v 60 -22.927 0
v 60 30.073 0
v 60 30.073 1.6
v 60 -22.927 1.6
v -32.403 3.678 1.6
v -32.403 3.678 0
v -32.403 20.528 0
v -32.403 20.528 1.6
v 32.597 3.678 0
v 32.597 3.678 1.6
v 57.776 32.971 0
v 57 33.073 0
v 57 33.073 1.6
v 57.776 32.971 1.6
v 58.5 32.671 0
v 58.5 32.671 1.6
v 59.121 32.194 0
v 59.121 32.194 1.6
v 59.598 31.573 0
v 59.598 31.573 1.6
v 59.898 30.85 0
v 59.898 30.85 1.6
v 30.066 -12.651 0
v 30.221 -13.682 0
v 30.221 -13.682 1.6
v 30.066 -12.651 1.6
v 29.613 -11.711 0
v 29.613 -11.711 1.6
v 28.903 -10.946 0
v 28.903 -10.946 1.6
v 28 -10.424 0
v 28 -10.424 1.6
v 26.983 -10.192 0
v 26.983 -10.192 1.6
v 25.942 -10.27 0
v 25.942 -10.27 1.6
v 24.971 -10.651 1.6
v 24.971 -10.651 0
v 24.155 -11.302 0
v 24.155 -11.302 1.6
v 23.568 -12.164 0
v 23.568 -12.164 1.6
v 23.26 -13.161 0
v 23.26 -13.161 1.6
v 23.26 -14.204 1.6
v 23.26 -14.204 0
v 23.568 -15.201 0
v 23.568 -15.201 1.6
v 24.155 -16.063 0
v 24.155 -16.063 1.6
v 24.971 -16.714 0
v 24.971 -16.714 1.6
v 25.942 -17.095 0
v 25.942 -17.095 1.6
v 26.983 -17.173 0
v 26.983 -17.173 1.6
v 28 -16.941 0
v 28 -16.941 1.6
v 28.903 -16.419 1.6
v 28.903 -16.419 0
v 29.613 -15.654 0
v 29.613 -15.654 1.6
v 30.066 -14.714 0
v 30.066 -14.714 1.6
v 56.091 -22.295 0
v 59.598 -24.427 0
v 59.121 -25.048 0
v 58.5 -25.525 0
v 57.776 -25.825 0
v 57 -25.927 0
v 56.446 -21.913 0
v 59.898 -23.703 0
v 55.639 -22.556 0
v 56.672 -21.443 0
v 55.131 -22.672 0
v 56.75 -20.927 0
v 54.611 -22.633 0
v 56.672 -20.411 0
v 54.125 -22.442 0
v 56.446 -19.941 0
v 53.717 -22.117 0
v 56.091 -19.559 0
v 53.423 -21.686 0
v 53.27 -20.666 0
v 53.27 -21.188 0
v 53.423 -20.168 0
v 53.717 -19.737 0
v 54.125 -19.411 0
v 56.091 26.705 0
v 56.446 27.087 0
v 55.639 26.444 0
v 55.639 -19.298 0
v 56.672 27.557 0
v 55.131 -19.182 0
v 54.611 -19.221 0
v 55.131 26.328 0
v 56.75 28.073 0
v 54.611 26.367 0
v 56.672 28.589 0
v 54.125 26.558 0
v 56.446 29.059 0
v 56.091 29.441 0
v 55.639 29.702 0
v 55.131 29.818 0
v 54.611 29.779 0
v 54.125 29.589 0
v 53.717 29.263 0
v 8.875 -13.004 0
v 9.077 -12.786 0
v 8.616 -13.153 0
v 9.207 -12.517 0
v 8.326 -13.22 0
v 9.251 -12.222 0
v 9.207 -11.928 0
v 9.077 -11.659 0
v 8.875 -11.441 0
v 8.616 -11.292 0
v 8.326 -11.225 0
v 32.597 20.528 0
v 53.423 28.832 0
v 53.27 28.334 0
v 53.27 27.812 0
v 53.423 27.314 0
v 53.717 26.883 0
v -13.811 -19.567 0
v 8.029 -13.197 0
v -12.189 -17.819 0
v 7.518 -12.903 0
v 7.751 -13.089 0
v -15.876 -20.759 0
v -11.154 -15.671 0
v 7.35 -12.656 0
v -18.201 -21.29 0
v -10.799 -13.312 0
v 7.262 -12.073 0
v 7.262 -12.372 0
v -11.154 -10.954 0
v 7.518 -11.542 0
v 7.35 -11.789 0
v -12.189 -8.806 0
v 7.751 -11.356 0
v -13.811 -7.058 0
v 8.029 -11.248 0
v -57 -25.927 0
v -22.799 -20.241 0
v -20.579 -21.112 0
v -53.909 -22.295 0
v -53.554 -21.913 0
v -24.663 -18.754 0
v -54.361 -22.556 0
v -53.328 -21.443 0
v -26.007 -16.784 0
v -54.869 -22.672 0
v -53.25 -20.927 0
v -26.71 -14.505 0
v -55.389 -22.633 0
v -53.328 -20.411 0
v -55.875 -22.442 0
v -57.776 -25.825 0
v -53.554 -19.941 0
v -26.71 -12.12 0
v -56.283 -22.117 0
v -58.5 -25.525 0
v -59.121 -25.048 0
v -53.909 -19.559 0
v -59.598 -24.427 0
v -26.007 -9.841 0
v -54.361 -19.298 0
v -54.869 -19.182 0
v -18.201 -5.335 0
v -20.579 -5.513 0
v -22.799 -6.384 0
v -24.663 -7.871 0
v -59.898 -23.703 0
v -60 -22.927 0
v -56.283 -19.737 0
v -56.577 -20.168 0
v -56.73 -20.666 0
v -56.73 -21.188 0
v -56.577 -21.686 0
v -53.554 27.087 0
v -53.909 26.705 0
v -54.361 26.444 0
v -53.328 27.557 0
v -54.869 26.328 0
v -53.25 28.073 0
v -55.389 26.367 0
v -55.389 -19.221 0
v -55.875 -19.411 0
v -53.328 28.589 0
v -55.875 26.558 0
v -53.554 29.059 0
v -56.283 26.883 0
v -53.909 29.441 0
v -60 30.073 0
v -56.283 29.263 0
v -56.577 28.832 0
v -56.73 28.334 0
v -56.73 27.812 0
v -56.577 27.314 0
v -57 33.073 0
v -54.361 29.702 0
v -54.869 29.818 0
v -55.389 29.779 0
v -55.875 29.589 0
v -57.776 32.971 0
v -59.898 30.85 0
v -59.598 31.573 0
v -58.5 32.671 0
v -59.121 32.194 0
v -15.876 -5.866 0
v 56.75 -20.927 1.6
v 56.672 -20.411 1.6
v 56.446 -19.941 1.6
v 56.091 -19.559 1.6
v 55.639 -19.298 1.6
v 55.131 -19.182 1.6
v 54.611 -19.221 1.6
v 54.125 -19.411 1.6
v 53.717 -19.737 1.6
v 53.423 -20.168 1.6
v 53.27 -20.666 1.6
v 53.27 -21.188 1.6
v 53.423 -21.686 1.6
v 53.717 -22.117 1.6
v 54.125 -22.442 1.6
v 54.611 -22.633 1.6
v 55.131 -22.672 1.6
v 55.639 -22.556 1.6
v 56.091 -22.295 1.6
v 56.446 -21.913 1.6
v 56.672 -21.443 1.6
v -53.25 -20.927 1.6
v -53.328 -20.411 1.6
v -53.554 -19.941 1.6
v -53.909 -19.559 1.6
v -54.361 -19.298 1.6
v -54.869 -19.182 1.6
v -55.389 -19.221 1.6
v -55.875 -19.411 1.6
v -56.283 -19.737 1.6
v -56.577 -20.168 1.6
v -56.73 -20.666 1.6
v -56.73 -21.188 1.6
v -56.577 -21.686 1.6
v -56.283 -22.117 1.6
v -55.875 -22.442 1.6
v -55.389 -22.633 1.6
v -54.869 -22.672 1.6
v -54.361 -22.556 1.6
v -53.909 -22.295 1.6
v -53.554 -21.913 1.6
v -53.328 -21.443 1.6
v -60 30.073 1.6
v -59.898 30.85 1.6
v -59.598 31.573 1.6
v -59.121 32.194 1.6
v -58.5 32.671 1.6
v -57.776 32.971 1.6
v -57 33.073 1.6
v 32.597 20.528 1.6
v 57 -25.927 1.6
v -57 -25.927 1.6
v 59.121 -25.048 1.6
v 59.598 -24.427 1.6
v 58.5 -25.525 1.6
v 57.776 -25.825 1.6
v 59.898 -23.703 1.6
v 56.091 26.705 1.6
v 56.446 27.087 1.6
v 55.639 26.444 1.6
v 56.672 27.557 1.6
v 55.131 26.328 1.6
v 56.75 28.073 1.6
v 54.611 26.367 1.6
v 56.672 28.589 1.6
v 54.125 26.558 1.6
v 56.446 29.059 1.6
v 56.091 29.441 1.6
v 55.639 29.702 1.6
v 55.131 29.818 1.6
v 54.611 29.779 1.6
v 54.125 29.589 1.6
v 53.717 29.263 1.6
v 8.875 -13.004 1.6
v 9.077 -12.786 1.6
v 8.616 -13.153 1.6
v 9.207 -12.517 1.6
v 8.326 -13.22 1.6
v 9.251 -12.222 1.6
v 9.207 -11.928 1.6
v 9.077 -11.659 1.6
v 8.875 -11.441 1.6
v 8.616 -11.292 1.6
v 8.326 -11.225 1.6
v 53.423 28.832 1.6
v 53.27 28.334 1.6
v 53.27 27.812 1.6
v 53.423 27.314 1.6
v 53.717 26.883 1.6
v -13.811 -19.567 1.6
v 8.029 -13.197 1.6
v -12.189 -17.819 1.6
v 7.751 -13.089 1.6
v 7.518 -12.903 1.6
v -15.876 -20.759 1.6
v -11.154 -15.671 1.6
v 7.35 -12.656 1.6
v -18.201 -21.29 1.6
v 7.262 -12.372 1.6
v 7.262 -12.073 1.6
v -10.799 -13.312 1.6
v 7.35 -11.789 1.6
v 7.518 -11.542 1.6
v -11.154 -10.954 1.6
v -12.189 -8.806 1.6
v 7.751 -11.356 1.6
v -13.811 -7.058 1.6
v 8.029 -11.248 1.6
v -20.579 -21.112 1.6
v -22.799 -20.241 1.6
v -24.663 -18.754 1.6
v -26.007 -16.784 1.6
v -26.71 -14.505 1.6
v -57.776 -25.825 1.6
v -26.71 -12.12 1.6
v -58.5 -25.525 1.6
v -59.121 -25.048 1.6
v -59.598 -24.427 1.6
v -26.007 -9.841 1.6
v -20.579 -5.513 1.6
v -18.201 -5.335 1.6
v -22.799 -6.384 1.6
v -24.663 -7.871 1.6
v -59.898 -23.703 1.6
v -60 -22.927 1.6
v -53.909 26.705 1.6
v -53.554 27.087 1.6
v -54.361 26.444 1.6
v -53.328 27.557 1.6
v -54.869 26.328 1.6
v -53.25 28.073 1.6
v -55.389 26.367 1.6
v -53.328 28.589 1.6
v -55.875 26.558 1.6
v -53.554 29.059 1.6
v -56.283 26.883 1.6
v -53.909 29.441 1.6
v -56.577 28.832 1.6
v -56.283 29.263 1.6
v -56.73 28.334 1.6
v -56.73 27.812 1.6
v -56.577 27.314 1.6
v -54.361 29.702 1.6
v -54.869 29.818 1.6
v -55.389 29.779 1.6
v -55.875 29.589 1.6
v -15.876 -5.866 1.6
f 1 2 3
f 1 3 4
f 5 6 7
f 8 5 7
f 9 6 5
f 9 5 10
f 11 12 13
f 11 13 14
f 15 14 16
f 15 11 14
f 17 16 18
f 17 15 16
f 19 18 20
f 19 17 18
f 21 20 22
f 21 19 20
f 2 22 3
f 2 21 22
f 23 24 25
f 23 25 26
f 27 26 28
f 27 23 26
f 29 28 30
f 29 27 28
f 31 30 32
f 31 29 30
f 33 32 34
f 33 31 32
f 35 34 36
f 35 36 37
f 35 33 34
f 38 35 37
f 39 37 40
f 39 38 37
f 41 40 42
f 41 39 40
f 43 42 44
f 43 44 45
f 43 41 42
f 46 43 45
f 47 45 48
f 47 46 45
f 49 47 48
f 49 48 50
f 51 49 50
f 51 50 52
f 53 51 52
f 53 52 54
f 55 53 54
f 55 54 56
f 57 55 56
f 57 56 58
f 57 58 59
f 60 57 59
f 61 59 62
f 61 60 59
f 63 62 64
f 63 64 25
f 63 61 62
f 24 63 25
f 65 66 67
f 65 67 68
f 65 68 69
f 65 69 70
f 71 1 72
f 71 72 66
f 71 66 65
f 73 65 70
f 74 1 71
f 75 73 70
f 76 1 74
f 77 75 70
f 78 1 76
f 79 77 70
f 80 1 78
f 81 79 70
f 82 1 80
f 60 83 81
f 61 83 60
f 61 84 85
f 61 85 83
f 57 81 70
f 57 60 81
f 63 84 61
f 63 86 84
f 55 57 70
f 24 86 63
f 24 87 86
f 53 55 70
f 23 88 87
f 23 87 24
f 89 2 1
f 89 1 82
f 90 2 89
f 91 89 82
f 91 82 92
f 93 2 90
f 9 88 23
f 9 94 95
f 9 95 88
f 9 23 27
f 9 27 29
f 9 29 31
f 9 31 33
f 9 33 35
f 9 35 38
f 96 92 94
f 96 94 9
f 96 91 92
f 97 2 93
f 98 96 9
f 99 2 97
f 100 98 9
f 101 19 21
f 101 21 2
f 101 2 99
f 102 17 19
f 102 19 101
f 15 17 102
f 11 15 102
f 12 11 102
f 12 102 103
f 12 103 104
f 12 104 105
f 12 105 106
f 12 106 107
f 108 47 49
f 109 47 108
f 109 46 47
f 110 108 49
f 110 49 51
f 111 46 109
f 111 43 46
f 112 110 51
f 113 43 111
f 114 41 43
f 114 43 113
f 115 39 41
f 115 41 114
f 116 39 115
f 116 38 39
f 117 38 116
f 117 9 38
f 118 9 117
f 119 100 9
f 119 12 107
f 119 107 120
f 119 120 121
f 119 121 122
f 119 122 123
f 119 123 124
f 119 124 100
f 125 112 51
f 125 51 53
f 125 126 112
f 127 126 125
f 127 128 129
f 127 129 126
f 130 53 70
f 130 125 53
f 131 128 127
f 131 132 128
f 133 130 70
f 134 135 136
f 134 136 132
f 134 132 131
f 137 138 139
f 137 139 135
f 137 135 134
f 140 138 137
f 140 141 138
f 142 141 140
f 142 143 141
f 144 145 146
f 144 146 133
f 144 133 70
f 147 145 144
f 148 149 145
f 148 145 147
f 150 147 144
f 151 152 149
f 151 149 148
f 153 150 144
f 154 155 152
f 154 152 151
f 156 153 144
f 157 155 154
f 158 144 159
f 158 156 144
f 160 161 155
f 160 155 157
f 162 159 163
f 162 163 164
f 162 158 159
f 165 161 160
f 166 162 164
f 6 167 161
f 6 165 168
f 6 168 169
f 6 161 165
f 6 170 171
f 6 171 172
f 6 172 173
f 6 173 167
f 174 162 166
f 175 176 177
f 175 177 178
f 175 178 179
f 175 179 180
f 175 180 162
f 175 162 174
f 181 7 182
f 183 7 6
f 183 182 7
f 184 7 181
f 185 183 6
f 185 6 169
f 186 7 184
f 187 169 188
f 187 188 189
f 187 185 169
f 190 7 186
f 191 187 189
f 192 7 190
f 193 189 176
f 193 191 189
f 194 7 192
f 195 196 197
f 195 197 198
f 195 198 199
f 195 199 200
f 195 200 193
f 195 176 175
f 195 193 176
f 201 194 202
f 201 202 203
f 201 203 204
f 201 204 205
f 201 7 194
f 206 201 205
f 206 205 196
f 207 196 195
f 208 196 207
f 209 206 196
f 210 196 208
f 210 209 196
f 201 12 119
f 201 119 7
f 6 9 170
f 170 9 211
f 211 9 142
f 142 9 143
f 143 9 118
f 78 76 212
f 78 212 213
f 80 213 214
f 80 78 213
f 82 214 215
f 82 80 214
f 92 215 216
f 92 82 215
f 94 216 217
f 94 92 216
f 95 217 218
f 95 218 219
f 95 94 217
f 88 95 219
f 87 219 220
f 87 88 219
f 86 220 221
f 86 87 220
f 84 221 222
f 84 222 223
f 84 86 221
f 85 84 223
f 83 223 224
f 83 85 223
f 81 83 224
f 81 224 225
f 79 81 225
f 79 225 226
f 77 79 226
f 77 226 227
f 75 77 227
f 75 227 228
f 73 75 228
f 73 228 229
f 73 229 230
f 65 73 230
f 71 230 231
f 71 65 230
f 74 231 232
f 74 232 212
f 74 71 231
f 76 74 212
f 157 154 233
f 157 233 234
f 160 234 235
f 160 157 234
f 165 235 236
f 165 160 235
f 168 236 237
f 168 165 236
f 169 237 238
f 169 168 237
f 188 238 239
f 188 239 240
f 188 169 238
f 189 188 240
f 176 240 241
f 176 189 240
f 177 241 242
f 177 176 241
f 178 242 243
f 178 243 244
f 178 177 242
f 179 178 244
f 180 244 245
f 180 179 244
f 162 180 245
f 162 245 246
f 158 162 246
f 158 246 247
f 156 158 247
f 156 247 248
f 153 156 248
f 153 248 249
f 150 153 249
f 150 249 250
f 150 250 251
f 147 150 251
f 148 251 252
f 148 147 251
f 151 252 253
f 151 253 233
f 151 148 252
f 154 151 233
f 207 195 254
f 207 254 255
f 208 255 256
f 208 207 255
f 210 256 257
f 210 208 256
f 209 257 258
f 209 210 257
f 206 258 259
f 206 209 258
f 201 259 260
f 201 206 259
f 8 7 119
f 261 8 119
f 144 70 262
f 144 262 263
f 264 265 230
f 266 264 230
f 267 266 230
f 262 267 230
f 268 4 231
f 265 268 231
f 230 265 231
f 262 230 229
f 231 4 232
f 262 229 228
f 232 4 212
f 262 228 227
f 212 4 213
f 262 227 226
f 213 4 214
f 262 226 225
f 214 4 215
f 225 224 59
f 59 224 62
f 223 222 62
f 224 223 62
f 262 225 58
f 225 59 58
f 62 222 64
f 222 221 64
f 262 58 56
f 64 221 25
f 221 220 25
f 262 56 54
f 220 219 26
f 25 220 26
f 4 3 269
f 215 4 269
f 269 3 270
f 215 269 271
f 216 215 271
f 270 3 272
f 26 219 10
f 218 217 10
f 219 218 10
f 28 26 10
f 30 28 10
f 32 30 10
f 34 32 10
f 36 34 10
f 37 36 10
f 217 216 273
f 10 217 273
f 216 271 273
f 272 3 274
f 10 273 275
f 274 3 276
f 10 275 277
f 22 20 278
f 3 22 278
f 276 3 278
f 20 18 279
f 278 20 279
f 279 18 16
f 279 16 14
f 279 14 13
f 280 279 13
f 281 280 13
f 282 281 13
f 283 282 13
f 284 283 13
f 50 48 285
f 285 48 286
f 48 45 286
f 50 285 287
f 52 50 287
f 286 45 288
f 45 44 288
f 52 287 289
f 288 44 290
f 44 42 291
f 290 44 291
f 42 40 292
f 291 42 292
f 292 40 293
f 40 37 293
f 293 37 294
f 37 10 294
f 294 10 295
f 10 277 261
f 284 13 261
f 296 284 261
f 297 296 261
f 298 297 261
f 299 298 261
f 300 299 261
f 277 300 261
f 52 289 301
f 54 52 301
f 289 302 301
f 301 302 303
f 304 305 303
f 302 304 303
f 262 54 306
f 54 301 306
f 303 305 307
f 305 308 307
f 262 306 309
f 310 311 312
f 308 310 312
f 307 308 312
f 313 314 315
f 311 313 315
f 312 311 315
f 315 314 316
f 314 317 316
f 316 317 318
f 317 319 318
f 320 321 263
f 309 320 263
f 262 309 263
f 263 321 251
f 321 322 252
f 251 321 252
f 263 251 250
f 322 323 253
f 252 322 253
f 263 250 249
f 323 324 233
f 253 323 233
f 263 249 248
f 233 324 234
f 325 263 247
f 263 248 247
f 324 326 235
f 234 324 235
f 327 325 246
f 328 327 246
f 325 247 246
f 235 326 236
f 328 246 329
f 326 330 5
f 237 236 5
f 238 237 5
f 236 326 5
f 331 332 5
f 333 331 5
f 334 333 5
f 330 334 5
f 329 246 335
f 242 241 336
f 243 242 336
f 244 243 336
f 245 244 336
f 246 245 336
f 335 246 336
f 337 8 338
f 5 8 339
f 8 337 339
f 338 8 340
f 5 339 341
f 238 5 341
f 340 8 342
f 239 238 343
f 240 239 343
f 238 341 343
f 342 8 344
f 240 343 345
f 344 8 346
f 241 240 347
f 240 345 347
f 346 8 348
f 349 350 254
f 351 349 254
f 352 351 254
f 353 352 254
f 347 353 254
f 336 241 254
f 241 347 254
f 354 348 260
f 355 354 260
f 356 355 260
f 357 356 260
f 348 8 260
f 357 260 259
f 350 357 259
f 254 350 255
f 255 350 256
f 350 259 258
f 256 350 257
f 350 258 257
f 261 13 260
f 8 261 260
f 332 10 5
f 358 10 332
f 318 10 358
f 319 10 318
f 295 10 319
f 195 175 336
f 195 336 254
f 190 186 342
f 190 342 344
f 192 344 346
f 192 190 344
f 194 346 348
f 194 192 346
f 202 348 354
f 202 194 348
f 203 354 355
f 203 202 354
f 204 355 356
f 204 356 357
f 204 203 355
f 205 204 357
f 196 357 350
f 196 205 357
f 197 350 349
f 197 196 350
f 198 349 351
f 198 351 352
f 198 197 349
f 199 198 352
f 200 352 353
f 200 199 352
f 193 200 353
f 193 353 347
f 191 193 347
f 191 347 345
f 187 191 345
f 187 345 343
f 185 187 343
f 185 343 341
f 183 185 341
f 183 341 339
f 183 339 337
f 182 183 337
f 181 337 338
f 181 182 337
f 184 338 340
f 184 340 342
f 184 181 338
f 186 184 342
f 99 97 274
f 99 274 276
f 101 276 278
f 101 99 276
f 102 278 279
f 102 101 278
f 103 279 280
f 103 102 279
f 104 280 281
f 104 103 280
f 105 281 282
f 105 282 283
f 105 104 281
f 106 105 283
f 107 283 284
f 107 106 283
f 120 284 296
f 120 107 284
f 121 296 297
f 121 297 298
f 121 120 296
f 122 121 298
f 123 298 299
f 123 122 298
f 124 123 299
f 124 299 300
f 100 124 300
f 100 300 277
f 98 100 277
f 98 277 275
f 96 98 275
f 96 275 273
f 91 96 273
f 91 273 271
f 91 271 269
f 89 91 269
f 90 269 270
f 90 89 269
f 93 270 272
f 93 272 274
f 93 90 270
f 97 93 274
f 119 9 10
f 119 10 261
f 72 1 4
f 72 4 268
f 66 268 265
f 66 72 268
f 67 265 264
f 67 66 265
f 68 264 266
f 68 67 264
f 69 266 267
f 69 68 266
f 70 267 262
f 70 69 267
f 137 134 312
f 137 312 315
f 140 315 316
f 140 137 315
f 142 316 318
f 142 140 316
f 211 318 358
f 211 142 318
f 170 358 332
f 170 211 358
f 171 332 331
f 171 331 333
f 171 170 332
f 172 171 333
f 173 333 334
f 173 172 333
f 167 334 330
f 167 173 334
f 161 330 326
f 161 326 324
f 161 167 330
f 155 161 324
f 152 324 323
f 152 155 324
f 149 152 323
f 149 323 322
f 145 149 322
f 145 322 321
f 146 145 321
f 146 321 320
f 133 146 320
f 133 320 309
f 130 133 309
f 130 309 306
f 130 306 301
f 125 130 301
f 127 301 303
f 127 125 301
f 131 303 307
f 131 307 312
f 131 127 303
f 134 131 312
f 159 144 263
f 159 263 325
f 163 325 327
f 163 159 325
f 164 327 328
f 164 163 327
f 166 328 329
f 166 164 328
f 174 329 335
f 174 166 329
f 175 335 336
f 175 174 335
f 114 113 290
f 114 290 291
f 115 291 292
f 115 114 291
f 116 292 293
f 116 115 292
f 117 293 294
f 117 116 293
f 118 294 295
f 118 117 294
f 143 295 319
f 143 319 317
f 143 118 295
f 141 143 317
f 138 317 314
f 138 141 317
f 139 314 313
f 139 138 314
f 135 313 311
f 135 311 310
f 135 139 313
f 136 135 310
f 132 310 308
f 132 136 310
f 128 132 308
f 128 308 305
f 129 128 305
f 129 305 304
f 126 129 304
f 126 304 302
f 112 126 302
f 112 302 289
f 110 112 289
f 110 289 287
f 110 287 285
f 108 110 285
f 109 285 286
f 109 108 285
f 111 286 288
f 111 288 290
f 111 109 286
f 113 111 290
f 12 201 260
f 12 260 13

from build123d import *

# Parameters (mm, degrees)
SKETCH_1_R      = 1.75
SKETCH_1_R_2    = 3.5
SKETCH_1_R_3    = 8
SKETCH_1_R_4    = 1
SKETCH_1_W      = 65
SKETCH_1_H      = 16.85
EXTRUDE_1_DEPTH = 1.6


with BuildPart() as part:
    # 草图1 → 凸台-拉伸1 (new body)
    with BuildSketch(Plane.XY):
        with BuildLine():
            Line((-57, 33.073154828), (57, 33.073154828))
            ThreePointArc((57, 33.073154828), (59.121320344, 32.194475172), (60, 30.073154828))
            Line((60, 30.073154828), (60, -22.926845172))
            ThreePointArc((60, -22.926845172), (59.121320344, -25.048165515), (57, -25.926845172))
            Line((57, -25.926845172), (-57, -25.926845172))
            ThreePointArc((-57, -25.926845172), (-59.121320344, -25.048165515), (-60, -22.926845172))
            Line((-60, -22.926845172), (-60, 30.073154828))
            ThreePointArc((-60, 30.073154828), (-59.121320344, 32.194475172), (-57, 33.073154828))
        make_face()
        with Locations((-55, -20.926845172)):
            Circle(SKETCH_1_R, mode=Mode.SUBTRACT)
        with Locations((55, -20.926845172)):
            Circle(SKETCH_1_R, mode=Mode.SUBTRACT)
        with Locations((55, 28.073154828)):
            Circle(SKETCH_1_R, mode=Mode.SUBTRACT)
        with Locations((-55, 28.073154828)):
            Circle(SKETCH_1_R, mode=Mode.SUBTRACT)
        with Locations((26.721118862, -13.682497654)):
            Circle(SKETCH_1_R_2, mode=Mode.SUBTRACT)
        with Locations((-18.798880758, -13.312497654)):
            Circle(SKETCH_1_R_3, mode=Mode.SUBTRACT)
        with Locations((8.251119242, -12.222497654)):
            Circle(SKETCH_1_R_4, mode=Mode.SUBTRACT)
        with Locations((0.097411242, 12.102502346)):
            Rectangle(SKETCH_1_W, SKETCH_1_H, mode=Mode.SUBTRACT)
    extrude(amount=EXTRUDE_1_DEPTH)


solid = part.part
